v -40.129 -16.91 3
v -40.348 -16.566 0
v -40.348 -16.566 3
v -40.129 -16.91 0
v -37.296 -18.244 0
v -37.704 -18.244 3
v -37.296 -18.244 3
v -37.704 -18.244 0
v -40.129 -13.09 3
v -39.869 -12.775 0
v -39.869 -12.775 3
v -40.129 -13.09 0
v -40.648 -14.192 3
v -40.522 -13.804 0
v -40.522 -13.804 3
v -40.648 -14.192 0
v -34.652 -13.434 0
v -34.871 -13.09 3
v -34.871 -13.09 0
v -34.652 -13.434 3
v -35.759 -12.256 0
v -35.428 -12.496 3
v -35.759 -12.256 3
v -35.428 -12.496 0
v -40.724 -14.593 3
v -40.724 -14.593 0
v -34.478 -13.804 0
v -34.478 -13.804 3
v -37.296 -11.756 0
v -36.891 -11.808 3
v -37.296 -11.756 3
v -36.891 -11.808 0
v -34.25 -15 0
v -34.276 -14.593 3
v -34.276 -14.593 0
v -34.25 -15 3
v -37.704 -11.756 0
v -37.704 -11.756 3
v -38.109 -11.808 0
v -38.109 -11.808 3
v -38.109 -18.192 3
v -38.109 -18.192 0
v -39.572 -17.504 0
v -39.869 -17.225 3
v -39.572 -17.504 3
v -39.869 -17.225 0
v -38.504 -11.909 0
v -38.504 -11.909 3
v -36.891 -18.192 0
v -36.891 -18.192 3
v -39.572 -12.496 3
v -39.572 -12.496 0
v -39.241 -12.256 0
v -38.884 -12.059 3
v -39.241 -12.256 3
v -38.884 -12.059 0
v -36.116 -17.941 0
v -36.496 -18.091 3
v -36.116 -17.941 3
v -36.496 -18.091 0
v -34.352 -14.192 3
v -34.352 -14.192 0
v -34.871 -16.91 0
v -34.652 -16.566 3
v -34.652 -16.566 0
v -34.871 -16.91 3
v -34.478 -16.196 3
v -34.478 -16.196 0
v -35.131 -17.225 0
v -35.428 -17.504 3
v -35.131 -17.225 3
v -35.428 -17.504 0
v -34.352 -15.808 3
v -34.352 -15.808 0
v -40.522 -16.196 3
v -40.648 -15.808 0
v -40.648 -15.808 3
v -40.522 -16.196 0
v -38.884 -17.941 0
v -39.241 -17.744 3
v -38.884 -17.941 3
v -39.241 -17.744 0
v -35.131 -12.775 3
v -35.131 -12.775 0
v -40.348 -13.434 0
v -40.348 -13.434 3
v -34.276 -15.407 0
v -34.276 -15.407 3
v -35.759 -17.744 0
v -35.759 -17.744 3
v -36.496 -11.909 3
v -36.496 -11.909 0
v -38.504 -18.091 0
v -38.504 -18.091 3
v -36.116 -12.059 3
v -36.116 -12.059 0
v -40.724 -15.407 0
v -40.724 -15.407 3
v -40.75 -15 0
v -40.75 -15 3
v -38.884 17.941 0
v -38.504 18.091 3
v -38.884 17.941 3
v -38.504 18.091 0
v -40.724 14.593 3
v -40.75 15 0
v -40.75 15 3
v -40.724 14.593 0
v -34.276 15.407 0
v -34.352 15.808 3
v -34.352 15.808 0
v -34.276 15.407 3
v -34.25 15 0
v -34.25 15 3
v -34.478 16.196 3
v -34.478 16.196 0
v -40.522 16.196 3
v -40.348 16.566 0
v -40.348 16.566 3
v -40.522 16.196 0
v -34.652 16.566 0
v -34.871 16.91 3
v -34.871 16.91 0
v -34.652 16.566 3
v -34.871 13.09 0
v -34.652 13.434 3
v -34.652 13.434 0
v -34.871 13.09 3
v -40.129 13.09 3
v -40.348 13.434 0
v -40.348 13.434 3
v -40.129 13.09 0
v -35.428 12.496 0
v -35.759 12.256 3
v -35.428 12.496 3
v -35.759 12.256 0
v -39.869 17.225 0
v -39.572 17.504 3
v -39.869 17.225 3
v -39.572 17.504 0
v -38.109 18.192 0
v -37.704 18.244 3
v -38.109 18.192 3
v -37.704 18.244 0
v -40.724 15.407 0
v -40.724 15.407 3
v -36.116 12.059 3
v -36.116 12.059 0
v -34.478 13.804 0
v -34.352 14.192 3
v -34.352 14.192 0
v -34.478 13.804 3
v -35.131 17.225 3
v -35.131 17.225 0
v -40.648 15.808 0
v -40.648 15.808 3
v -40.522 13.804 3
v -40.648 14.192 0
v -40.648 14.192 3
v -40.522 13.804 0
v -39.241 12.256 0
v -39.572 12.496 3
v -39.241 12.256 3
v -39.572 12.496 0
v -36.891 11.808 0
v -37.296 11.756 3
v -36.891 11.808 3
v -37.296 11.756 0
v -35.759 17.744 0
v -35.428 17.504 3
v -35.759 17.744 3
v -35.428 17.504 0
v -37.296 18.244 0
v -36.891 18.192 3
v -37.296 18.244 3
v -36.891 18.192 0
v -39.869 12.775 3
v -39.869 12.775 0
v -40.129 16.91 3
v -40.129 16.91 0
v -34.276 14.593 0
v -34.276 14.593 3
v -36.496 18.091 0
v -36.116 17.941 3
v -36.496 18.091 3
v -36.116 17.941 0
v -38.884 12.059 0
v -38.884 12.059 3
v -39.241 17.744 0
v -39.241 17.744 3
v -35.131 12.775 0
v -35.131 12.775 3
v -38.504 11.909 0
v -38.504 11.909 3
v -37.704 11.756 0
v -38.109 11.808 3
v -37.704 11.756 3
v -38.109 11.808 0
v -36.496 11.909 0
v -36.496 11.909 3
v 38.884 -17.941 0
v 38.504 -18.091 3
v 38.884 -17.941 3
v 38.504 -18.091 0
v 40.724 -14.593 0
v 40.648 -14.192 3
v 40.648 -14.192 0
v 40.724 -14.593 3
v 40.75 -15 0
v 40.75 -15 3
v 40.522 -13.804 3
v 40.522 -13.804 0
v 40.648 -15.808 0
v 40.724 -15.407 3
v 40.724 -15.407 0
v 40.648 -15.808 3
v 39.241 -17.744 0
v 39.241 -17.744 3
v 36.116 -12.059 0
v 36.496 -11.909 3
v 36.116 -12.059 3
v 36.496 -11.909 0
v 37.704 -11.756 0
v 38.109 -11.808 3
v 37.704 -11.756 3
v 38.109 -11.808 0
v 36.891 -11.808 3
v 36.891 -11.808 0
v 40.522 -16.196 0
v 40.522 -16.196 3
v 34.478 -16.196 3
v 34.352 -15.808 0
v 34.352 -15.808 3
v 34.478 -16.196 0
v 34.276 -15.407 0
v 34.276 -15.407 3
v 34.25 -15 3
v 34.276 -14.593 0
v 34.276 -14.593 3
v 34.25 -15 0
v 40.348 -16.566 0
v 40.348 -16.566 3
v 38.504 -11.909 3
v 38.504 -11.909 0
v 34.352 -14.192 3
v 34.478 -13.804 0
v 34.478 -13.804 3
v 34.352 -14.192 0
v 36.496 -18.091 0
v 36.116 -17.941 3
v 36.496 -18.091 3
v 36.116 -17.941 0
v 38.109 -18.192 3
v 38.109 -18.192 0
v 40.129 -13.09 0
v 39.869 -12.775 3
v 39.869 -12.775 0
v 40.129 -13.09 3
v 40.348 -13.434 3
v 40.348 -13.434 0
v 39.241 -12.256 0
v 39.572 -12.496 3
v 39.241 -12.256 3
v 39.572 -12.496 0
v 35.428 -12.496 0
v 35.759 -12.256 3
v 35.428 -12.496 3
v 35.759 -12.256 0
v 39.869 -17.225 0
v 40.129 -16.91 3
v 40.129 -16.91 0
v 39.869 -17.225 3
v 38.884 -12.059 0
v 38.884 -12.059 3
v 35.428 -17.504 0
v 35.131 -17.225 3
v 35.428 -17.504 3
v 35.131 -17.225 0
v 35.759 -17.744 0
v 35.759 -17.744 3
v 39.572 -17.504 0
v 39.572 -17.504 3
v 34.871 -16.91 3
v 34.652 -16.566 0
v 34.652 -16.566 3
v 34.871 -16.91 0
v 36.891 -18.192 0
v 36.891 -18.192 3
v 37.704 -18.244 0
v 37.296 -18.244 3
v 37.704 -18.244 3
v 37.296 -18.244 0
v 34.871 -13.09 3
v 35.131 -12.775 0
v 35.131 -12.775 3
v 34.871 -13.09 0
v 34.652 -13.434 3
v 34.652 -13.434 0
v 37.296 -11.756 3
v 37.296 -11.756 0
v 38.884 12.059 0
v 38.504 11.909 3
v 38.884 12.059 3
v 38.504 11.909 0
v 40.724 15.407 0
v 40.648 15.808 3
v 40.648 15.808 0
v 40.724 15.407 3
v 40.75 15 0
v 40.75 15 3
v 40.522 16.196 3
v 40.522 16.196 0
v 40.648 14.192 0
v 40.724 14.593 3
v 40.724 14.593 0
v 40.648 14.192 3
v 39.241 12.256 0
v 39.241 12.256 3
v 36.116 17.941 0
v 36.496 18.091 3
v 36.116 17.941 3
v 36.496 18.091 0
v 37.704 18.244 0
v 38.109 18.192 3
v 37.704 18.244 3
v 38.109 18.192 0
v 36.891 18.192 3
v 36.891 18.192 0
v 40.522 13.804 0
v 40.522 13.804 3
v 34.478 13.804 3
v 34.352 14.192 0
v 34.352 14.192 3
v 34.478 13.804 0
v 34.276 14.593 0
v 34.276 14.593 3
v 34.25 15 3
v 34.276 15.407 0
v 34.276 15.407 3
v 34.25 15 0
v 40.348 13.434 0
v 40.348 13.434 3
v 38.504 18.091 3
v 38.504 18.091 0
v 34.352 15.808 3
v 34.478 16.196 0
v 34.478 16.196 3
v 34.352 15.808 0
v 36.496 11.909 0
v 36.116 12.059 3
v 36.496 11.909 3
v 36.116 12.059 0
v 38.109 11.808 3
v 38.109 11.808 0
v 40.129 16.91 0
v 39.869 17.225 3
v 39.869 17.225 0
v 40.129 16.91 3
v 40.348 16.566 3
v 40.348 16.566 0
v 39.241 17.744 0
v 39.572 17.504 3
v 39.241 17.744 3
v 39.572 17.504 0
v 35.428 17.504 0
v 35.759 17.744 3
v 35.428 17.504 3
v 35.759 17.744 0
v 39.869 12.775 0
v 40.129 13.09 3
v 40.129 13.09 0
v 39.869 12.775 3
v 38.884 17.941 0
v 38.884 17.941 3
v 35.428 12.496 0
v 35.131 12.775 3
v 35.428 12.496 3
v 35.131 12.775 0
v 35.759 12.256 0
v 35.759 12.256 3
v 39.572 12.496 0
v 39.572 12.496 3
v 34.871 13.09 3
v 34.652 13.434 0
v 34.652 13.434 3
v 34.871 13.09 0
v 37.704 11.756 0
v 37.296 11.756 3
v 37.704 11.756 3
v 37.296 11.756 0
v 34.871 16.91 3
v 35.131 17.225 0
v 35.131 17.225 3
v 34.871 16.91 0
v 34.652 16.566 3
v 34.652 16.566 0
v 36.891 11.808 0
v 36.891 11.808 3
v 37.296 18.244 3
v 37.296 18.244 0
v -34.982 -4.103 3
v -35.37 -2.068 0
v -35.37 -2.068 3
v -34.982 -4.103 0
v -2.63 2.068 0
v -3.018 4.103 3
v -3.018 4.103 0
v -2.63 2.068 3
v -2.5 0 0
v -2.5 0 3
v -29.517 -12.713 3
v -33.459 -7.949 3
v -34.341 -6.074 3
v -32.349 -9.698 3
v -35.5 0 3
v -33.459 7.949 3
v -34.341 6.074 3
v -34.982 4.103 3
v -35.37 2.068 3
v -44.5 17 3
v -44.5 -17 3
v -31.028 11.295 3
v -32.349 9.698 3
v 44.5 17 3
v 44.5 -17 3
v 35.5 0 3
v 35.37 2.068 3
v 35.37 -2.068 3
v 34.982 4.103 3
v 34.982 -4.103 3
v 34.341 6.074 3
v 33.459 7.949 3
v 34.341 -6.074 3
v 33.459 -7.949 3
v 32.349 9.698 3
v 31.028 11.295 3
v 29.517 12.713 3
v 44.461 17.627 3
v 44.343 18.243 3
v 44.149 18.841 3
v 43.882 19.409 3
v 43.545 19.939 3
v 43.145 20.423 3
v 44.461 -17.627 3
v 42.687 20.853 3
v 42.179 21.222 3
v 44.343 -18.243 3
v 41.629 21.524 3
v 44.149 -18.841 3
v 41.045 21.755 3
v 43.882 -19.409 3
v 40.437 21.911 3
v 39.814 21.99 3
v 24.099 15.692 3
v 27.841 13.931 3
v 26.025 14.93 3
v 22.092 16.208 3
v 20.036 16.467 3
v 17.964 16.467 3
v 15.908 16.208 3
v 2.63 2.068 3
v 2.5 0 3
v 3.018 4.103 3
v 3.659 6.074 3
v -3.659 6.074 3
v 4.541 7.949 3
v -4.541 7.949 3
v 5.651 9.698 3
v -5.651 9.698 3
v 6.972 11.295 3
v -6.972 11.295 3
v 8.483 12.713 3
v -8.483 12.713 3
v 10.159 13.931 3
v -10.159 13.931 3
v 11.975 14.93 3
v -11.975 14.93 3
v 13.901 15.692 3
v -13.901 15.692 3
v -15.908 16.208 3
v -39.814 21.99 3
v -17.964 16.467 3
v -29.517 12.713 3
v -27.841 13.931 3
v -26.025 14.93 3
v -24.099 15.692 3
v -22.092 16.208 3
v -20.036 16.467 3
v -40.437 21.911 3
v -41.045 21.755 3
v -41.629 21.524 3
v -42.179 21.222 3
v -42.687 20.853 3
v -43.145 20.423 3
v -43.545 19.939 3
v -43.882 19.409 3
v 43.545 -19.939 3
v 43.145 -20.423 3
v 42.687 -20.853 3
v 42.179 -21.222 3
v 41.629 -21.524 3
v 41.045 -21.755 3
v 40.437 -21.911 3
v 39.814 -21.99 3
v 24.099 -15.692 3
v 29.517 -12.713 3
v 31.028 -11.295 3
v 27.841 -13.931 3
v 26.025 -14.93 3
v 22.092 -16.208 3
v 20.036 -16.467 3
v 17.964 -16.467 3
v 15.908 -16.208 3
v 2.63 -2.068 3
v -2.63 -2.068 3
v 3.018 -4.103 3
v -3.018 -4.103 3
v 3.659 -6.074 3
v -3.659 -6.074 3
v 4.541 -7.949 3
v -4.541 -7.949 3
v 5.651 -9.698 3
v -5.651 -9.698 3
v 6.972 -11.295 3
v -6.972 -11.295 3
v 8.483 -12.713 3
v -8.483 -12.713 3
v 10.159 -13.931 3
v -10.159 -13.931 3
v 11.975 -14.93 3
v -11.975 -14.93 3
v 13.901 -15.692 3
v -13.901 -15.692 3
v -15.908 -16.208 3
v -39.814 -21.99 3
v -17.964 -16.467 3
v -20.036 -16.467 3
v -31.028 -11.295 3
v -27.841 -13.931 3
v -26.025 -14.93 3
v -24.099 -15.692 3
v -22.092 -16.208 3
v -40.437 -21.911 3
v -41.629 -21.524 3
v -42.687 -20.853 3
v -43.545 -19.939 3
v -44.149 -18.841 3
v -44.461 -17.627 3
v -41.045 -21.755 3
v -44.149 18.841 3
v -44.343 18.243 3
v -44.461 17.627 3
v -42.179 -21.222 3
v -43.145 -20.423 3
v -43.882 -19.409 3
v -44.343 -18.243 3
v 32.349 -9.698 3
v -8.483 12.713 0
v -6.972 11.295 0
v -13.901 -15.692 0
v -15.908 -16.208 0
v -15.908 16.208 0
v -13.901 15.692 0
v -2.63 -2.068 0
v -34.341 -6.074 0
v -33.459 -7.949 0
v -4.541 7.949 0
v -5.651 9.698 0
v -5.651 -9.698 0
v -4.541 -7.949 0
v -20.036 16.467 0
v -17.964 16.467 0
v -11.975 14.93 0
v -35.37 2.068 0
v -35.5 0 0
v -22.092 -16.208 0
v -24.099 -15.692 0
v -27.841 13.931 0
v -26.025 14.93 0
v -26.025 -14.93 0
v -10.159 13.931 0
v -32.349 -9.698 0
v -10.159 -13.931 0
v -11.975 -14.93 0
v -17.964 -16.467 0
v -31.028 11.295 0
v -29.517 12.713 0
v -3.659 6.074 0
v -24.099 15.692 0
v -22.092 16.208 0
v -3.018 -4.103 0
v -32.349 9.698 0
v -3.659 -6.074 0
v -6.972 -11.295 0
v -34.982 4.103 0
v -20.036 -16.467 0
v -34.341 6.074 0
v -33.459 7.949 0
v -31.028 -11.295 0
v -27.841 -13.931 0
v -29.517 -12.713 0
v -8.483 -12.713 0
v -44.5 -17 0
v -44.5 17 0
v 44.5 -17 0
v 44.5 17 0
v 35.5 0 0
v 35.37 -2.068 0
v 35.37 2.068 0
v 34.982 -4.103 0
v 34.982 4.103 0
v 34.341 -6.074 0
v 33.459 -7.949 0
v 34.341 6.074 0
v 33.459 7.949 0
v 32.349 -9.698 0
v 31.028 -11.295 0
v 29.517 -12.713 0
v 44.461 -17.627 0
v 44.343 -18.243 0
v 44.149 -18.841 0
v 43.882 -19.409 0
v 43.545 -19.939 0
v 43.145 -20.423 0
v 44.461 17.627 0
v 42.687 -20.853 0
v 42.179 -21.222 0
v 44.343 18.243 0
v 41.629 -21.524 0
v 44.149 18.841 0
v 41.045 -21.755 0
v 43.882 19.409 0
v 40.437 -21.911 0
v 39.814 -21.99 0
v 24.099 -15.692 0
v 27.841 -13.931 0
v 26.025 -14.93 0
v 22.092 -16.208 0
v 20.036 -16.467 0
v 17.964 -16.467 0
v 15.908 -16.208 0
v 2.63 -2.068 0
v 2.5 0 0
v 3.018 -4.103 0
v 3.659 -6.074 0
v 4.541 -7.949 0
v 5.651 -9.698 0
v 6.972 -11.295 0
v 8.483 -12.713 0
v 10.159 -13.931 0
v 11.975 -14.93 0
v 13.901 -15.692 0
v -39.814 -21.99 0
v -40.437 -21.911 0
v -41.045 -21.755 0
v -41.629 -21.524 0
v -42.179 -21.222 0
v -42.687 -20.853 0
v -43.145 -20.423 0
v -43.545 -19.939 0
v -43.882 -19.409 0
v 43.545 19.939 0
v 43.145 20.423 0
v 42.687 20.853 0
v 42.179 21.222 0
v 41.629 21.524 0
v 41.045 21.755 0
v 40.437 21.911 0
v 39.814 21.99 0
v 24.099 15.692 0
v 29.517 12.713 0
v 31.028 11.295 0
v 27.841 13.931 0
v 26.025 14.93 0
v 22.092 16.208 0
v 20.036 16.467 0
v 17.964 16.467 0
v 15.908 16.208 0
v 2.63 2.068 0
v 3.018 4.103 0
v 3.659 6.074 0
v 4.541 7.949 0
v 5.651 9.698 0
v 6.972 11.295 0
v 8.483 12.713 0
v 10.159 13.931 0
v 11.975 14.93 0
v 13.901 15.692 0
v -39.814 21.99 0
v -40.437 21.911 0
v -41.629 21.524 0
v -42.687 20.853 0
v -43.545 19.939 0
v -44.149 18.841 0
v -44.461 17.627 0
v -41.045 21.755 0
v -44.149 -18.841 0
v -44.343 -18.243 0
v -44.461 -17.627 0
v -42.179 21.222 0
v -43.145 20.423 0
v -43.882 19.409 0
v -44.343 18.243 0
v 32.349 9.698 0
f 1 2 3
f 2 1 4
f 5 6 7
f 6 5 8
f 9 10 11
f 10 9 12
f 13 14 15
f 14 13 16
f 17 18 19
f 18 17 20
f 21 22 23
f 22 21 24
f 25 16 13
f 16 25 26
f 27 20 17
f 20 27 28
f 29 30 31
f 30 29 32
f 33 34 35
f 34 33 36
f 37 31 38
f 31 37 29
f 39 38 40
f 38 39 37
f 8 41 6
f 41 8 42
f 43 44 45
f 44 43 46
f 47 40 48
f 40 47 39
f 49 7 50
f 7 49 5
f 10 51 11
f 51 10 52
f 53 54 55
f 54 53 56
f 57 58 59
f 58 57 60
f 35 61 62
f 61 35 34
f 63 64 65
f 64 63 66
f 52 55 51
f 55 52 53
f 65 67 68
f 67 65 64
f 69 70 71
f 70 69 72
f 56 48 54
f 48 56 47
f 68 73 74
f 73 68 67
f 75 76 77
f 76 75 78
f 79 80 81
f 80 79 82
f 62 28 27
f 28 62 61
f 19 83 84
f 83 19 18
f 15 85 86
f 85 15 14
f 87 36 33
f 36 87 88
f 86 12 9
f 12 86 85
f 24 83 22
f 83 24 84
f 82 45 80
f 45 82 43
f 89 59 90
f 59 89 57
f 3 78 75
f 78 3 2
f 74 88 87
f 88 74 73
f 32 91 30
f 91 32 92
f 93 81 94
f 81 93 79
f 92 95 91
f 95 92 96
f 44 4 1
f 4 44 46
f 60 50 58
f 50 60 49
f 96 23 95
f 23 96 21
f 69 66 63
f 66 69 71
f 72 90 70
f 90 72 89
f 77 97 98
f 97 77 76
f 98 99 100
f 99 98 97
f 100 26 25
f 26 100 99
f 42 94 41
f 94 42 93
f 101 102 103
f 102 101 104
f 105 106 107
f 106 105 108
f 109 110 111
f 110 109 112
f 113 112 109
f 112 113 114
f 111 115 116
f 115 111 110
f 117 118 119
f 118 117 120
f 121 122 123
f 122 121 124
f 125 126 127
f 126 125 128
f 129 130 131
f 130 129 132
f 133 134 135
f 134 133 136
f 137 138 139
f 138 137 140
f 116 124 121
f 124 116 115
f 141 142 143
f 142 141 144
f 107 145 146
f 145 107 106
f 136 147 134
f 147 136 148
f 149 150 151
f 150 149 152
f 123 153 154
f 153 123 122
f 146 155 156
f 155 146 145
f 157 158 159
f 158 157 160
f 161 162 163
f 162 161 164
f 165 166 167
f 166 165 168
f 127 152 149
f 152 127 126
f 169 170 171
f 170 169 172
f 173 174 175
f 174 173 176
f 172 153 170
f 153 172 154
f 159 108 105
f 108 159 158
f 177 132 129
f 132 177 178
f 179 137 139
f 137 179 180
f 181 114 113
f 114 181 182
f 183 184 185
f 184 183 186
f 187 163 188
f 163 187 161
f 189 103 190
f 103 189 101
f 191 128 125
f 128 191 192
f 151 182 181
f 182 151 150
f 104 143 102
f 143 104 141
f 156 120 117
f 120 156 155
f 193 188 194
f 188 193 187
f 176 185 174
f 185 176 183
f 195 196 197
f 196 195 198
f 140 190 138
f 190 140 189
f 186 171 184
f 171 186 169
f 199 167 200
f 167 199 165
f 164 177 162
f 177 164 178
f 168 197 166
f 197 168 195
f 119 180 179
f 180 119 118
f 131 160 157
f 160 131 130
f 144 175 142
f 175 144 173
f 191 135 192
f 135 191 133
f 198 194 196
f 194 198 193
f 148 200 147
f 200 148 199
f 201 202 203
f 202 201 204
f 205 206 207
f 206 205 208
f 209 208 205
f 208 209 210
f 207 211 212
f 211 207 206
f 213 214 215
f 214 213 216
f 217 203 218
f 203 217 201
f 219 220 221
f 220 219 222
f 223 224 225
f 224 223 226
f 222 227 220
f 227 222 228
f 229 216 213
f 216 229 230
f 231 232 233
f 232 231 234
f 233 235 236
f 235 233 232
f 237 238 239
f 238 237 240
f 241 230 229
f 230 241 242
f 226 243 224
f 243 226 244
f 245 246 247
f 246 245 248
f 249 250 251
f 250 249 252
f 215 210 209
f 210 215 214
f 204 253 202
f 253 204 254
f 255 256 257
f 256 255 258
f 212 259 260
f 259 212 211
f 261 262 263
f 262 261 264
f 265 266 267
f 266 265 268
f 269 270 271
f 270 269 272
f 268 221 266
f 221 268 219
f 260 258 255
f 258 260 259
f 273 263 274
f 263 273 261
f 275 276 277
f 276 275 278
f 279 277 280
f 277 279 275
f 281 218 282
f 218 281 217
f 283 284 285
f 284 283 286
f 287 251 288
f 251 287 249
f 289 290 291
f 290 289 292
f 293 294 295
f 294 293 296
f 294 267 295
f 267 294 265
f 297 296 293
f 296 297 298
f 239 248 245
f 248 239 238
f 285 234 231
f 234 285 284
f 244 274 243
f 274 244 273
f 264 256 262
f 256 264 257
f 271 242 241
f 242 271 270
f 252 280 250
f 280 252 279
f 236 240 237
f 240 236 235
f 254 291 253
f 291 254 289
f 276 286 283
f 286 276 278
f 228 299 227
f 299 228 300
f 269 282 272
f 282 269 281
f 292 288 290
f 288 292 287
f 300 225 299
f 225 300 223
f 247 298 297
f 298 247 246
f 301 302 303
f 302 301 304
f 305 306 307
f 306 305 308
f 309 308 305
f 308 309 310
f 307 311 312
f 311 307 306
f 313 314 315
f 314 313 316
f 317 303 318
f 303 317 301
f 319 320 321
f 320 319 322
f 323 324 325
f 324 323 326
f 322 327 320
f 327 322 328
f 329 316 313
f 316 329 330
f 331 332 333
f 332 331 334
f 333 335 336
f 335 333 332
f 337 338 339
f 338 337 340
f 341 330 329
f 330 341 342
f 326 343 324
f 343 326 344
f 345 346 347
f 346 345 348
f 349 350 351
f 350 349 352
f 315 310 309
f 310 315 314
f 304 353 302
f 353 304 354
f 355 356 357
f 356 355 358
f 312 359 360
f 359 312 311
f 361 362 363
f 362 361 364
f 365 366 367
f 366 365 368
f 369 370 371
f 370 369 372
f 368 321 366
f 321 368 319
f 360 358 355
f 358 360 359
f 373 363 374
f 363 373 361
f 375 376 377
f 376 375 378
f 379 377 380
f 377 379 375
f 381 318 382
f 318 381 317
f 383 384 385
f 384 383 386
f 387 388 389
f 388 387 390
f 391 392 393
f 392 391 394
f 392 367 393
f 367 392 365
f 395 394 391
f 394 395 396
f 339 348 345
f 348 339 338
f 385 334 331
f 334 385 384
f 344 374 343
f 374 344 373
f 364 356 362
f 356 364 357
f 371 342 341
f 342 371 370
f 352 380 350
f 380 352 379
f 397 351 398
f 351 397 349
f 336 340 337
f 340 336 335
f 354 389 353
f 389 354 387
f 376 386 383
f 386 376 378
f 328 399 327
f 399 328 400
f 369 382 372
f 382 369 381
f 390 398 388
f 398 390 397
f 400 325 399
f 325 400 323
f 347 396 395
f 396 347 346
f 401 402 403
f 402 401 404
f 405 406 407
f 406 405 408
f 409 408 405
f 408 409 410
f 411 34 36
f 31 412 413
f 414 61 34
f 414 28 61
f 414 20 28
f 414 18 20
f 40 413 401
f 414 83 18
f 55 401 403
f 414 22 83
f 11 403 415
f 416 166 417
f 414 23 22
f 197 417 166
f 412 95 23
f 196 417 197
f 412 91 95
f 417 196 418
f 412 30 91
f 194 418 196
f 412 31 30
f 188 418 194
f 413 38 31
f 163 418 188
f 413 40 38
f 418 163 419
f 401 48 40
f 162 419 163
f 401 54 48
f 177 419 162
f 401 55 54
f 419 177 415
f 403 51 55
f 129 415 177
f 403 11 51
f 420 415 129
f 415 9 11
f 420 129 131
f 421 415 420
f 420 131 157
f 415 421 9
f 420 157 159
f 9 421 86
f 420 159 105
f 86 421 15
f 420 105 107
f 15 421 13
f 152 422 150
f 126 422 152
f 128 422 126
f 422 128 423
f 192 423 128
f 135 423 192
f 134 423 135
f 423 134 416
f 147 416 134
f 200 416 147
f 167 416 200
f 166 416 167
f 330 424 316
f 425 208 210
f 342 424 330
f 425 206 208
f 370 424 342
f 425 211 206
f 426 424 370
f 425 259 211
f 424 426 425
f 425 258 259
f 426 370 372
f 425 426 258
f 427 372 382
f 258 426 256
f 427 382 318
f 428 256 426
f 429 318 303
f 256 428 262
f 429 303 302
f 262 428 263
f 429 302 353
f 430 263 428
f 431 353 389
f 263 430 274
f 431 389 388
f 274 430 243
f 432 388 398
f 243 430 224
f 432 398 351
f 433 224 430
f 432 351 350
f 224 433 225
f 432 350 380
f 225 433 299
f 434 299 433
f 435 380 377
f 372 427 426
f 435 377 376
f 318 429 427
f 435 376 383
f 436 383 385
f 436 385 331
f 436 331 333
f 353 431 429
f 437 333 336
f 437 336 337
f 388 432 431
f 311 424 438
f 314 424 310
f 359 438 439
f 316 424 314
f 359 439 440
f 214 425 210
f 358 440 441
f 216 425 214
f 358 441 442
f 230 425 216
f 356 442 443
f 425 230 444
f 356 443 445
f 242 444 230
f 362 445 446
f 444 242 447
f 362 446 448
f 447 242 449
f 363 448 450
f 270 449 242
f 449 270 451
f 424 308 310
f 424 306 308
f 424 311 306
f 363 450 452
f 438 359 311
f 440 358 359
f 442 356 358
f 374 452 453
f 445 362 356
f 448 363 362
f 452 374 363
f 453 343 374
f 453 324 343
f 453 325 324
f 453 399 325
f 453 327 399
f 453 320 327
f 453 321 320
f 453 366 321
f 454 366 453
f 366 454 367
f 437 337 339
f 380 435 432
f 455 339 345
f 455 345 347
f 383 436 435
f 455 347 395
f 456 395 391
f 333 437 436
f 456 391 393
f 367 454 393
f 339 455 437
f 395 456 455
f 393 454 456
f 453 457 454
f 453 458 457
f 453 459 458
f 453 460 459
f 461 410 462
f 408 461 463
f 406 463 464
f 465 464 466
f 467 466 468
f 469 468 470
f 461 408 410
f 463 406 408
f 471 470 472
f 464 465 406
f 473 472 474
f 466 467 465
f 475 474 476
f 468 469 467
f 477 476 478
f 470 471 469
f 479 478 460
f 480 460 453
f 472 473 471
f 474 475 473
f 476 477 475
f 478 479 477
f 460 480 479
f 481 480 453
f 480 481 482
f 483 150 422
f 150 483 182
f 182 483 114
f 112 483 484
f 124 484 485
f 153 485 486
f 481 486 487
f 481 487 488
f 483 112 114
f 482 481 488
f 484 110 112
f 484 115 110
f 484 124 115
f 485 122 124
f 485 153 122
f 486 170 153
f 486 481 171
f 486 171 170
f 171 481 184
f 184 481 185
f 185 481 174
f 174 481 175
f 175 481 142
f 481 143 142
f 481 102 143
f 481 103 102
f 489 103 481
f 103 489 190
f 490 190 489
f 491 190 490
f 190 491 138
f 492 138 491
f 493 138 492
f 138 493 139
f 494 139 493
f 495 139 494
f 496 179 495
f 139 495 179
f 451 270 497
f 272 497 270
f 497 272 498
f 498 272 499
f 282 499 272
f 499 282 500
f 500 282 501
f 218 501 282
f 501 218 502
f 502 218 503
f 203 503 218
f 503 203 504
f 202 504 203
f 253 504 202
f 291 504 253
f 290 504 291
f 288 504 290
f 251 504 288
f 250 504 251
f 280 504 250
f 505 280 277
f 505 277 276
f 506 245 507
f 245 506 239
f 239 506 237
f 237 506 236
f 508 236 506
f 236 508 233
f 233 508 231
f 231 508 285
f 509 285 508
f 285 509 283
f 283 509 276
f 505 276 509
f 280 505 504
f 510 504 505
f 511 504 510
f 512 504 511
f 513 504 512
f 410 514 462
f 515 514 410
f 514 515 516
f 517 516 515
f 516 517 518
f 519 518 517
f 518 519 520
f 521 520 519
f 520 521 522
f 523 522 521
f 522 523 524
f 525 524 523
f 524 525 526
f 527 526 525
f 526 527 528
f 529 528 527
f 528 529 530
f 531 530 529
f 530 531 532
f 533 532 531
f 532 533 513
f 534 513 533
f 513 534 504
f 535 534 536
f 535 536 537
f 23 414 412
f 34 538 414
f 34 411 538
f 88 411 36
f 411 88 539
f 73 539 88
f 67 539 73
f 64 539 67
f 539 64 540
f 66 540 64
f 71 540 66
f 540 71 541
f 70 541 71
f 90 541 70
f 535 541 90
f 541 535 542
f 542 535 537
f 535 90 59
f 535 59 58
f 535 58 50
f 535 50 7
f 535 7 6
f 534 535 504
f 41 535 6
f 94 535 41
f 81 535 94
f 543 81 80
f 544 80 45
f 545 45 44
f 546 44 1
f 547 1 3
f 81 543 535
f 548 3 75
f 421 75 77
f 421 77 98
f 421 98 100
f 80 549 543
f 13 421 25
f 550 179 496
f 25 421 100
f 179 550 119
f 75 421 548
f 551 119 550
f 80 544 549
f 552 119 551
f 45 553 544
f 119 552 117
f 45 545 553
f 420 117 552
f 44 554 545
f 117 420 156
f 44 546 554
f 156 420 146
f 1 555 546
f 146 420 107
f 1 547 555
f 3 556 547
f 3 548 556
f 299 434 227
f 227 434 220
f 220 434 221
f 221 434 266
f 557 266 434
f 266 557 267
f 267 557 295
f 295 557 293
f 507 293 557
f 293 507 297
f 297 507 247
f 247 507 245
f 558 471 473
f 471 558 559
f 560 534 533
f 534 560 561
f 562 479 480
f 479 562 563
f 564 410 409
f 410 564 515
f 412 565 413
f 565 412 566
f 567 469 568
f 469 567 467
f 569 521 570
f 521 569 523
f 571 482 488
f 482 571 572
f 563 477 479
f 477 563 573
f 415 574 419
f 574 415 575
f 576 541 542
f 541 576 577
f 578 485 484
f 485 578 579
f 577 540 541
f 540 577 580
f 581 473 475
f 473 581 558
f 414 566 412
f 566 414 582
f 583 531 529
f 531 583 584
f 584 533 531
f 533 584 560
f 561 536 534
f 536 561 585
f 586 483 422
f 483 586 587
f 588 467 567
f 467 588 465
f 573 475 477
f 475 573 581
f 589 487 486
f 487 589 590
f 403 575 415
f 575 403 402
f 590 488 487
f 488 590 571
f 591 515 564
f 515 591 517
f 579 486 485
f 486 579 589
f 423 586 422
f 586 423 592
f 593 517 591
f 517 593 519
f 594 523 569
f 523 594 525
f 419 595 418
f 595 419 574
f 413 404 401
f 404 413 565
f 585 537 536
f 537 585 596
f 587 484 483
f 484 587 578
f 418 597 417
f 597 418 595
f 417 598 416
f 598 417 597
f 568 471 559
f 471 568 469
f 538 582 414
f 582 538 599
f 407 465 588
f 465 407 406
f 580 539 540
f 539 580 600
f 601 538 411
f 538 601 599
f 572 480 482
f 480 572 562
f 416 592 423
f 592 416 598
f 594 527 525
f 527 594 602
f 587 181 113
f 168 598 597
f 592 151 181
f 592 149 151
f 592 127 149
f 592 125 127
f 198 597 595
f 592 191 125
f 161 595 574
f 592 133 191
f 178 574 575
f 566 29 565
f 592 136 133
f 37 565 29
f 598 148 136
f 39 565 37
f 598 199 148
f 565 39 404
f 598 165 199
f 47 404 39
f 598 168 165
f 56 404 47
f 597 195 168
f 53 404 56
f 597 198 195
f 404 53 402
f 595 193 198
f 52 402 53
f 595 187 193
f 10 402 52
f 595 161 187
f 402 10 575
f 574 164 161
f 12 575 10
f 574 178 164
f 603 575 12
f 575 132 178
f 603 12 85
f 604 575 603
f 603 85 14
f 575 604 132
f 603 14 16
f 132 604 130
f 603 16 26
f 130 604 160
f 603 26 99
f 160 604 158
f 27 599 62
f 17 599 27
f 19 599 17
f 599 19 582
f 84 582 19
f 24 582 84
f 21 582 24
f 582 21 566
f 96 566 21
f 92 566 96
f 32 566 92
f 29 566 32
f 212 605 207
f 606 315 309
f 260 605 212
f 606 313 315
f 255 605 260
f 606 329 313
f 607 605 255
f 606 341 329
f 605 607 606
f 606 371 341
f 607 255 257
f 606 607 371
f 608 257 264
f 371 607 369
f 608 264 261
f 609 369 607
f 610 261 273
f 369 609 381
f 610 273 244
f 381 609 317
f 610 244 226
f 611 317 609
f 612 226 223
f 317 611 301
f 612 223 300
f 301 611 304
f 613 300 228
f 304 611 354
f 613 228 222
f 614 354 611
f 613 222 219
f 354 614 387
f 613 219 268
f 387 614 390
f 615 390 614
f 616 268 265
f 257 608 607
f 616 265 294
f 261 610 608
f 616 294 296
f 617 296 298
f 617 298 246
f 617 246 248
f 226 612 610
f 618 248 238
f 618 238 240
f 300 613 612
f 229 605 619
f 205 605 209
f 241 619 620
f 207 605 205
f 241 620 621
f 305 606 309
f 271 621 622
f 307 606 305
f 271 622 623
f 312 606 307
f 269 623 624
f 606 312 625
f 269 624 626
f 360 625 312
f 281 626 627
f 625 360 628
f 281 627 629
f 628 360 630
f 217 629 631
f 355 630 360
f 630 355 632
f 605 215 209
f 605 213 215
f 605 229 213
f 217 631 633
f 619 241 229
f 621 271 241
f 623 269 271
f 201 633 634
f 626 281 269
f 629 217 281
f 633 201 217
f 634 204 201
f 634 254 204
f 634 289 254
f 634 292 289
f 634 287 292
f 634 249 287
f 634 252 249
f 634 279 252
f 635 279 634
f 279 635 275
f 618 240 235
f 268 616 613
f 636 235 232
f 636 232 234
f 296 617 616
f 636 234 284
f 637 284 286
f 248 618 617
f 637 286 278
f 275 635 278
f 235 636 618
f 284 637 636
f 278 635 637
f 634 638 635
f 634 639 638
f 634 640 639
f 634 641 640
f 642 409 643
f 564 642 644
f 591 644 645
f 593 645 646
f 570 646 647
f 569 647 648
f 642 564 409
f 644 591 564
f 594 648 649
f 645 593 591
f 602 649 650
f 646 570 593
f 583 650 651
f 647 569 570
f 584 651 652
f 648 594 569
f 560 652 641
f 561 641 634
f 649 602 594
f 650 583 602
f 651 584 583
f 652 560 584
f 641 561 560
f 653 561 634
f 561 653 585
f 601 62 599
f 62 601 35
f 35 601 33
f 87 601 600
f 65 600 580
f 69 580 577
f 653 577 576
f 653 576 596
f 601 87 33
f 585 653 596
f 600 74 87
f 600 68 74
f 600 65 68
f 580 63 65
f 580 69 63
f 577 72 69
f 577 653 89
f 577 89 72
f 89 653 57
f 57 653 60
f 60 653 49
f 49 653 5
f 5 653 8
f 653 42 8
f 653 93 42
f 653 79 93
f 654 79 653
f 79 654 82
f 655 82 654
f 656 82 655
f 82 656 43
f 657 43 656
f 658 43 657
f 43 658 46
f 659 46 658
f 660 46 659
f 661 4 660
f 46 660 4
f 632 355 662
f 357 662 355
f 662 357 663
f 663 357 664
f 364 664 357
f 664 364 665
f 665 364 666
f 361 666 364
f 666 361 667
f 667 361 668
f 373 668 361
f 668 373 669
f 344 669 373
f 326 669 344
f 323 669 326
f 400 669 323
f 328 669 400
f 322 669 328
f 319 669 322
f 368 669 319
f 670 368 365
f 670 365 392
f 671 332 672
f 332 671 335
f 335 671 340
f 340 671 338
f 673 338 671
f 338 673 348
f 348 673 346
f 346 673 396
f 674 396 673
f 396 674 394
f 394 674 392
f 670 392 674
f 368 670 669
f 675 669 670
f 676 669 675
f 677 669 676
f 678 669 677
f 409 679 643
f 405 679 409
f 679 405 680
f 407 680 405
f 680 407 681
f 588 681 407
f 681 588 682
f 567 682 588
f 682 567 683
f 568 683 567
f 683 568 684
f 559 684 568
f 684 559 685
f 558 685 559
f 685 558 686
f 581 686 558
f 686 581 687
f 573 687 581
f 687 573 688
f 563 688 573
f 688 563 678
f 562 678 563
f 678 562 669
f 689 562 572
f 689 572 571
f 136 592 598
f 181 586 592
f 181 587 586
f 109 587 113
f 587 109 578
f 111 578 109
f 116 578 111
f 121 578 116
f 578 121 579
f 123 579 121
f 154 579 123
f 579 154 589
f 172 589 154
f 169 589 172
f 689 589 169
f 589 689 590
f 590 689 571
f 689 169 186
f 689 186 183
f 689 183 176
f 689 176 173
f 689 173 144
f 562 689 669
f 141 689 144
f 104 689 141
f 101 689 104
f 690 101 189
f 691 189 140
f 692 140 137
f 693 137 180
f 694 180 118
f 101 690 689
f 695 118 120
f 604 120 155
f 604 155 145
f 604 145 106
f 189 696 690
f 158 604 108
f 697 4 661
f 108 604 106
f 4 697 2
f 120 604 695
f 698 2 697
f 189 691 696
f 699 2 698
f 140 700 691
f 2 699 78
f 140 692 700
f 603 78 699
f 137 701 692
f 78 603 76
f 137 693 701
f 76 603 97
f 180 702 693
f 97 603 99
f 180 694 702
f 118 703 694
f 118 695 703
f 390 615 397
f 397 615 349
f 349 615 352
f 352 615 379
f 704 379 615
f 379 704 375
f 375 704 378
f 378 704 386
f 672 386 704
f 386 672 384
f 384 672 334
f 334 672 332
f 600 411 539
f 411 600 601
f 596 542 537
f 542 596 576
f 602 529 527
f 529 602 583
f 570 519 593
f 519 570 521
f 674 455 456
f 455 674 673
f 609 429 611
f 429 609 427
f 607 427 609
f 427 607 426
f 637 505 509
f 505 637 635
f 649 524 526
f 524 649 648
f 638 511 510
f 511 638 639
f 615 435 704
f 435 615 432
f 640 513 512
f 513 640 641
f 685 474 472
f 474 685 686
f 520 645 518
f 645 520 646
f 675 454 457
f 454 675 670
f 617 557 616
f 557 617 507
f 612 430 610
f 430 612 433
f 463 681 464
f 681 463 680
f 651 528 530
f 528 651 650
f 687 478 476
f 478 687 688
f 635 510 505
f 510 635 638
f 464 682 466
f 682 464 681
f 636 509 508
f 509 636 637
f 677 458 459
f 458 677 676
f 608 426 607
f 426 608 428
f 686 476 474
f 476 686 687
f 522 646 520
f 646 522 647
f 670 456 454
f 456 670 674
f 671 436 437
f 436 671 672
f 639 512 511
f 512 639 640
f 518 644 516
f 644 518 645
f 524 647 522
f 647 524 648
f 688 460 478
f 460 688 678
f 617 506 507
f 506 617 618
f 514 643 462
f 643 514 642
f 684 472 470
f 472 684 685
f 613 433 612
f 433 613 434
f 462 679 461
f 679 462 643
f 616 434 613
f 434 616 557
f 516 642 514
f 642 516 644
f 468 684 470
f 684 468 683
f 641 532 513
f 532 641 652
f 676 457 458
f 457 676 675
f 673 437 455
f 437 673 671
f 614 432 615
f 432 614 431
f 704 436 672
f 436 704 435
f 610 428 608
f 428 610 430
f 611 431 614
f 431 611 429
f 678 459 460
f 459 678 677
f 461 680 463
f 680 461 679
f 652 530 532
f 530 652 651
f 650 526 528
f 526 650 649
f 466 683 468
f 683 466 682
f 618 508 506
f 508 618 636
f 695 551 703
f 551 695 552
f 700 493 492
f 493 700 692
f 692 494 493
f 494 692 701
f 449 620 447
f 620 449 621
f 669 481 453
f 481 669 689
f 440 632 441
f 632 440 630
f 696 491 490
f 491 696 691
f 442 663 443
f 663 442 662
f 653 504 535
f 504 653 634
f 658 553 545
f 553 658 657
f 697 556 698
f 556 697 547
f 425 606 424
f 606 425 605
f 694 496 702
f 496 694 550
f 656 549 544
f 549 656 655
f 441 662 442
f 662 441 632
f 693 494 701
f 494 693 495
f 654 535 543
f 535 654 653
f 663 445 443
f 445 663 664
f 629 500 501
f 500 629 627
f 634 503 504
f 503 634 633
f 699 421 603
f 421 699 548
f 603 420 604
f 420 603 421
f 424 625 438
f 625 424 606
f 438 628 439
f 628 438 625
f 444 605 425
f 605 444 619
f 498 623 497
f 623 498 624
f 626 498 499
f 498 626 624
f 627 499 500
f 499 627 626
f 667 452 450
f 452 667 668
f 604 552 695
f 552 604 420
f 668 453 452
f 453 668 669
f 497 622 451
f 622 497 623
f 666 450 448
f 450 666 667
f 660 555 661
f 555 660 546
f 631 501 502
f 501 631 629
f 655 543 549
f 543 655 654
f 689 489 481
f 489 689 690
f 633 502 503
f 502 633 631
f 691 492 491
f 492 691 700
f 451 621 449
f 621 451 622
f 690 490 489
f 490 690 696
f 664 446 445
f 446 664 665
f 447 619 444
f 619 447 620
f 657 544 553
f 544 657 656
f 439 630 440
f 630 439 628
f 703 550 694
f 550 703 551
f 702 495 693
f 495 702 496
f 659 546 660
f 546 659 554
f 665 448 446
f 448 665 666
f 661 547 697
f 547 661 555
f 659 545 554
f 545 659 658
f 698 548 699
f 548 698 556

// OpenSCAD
$fn = 50;


difference() {
	union() {
		hull() {
			translate(v = [-39.5000000000, 17.0000000000, 0]) {
				cylinder(h = 3, r = 5);
			}
			translate(v = [39.5000000000, 17.0000000000, 0]) {
				cylinder(h = 3, r = 5);
			}
			translate(v = [-39.5000000000, -17.0000000000, 0]) {
				cylinder(h = 3, r = 5);
			}
			translate(v = [39.5000000000, -17.0000000000, 0]) {
				cylinder(h = 3, r = 5);
			}
		}
	}
	union() {
		#translate(v = [-37.5000000000, -15.0000000000, -100.0000000000]) {
			cylinder(h = 200, r = 3.2500000000);
		}
		#translate(v = [-37.5000000000, 15.0000000000, -100.0000000000]) {
			cylinder(h = 200, r = 3.2500000000);
		}
		#translate(v = [37.5000000000, -15.0000000000, -100.0000000000]) {
			cylinder(h = 200, r = 3.2500000000);
		}
		#translate(v = [37.5000000000, 15.0000000000, -100.0000000000]) {
			cylinder(h = 200, r = 3.2500000000);
		}
		#translate(v = [-19.0000000000, 0, 0]) {
			cylinder(h = 3, r = 16.5000000000);
		}
		#translate(v = [19.0000000000, 0, 0]) {
			cylinder(h = 3, r = 16.5000000000);
		}
	}
}
